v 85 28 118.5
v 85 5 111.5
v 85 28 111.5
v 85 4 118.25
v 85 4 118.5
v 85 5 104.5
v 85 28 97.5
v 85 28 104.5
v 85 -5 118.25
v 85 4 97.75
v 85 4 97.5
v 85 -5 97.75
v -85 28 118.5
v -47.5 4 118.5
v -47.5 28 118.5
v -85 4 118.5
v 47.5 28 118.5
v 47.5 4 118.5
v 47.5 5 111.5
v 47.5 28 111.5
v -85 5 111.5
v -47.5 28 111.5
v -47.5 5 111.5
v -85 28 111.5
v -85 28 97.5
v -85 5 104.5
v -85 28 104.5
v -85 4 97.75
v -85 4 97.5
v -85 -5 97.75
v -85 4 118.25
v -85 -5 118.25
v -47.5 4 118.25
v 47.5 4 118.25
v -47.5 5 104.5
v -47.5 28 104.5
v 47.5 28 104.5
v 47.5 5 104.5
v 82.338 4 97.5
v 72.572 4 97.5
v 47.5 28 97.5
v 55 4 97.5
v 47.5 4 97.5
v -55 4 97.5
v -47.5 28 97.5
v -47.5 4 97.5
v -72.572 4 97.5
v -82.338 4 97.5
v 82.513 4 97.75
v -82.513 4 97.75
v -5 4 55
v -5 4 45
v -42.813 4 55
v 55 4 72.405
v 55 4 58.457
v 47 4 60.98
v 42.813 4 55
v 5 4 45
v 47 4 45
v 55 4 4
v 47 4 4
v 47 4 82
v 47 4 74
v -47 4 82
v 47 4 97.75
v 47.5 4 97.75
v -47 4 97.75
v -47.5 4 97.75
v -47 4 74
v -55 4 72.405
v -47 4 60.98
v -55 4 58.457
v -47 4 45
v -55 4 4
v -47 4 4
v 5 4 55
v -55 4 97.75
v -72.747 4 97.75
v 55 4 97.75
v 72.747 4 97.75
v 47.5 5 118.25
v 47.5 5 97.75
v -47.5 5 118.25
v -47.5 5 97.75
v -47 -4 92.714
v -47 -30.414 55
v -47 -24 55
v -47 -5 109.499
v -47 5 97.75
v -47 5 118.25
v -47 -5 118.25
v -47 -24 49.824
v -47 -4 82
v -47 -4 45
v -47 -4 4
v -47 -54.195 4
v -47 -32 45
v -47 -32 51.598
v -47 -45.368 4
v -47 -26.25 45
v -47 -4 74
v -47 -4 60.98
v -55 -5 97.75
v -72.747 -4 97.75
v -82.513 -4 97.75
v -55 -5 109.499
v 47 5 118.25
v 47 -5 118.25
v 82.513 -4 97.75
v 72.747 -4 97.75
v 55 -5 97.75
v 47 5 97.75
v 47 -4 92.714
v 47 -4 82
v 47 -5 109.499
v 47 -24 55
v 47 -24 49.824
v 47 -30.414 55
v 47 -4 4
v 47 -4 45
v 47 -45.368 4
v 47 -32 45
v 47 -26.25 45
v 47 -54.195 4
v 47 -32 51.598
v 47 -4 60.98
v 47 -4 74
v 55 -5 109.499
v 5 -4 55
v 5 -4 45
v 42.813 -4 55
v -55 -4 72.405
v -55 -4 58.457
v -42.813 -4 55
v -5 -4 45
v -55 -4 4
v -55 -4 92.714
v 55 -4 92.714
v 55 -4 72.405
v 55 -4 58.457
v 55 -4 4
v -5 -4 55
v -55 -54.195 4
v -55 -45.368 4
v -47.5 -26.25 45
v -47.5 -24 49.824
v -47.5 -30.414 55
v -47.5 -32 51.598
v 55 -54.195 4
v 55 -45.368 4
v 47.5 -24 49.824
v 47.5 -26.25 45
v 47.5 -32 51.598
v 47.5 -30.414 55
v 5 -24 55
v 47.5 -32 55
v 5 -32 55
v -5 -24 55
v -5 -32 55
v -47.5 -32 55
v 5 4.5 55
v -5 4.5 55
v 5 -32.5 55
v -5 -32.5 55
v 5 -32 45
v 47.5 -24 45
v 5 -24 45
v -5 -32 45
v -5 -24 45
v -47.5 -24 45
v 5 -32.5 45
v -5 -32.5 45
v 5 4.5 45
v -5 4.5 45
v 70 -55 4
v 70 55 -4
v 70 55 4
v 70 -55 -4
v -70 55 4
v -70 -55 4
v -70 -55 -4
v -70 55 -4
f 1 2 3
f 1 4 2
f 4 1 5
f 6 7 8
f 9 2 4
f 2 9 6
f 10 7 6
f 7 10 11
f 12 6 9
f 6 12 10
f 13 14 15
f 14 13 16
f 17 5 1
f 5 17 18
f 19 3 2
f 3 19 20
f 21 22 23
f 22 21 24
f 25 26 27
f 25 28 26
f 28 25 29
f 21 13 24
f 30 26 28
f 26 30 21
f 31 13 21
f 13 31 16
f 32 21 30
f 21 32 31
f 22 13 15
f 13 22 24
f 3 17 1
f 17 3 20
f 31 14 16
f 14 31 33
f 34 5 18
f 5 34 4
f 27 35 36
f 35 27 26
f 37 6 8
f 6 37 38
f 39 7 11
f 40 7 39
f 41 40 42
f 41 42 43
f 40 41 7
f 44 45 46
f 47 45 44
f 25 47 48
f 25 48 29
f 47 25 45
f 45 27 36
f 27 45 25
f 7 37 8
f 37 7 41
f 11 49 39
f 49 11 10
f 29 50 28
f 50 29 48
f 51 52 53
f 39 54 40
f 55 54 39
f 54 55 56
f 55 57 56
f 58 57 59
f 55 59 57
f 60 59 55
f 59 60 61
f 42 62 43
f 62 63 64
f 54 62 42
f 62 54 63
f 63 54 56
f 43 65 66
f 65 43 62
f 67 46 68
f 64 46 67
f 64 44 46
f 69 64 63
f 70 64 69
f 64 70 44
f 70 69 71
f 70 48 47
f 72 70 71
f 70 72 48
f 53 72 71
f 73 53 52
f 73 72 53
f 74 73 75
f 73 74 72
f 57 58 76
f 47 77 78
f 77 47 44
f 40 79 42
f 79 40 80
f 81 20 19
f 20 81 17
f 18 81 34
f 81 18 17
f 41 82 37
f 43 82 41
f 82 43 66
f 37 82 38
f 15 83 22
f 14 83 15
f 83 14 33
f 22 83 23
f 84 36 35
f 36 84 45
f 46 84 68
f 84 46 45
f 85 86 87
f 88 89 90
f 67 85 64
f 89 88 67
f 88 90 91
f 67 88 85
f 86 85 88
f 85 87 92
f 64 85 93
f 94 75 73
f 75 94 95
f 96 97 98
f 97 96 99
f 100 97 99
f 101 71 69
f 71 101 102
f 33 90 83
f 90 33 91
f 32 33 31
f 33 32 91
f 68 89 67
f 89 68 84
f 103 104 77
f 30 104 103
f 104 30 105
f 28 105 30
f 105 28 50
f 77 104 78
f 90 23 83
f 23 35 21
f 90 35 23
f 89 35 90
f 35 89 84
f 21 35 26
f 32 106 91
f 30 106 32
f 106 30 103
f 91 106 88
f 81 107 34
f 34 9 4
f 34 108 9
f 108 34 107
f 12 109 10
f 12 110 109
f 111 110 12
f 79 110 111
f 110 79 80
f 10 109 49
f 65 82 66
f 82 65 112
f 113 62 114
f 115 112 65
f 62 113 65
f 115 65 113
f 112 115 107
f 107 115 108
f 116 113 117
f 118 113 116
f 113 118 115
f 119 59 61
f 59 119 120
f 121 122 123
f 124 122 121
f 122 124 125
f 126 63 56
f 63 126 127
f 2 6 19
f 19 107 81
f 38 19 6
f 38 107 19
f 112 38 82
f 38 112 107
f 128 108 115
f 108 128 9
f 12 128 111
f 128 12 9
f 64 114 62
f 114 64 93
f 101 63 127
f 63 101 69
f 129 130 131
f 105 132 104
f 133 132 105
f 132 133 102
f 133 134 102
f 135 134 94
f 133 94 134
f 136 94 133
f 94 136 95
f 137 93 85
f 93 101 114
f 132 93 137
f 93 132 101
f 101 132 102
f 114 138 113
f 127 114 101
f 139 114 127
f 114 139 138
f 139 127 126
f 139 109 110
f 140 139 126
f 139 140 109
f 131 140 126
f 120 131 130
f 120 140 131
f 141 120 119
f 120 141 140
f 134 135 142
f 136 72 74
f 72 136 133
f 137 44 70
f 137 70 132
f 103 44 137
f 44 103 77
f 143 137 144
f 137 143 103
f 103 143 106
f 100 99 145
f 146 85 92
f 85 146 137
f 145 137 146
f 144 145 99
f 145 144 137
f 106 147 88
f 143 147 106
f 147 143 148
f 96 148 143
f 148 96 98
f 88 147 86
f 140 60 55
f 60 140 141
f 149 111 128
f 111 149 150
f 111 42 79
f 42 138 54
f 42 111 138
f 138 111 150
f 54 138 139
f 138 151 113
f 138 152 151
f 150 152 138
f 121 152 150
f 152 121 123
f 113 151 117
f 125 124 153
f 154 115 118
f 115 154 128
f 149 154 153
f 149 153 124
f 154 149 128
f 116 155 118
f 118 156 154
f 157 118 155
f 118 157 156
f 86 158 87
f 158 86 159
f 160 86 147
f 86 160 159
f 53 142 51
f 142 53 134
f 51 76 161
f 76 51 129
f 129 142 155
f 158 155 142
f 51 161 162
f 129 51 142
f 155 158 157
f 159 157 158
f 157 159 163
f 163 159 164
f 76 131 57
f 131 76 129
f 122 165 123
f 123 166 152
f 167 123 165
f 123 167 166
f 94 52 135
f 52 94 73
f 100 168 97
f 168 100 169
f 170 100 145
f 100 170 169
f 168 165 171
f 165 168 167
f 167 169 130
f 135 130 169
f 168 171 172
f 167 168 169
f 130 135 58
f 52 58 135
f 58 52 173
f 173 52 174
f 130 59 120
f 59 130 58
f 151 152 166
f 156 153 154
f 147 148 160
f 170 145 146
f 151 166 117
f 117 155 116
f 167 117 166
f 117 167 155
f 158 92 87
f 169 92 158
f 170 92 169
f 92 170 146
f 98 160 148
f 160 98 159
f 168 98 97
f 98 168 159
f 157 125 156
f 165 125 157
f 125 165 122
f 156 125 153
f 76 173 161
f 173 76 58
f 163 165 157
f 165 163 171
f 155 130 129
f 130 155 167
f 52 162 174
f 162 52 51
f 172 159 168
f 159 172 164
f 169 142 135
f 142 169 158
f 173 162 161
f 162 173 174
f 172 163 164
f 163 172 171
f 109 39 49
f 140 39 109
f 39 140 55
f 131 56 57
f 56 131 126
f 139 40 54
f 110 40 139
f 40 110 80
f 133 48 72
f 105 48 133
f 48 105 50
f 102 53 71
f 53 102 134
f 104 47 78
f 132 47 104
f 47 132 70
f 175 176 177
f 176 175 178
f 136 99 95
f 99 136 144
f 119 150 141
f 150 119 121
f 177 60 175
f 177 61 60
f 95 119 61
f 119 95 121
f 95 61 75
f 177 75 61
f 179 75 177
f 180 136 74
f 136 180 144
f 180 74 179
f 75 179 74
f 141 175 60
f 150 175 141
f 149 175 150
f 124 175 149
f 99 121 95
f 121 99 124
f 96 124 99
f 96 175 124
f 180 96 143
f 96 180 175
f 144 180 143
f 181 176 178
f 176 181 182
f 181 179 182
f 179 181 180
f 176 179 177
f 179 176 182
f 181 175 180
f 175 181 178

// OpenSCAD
// file: ../robot_settings.scad
main_box_x = 100; // 96
main_box_y = 102;
main_box_z = 74; // 74.5

lfp_main_box_x = 65;
lfp_main_box_y = 152;
lfp_main_box_z = 94;

wall_thickness = 5;

rail_gap = 2;
rail_inset = 7;

rail_thickness = 7;
rail_length = 250;
rail_width = 260;

lfp_battery_width = 65.5;
lfp_battery_depth = 150.5;
lfp_battery_height = 93;
lfp_battery_midterrace_width = 64.8;
lfp_battery_midterrace_depth = 150.2;
lfp_battery_midterrace_height = 7.8;
lfp_battery_topterrace_width = 62.8;
lfp_battery_topterrace_depth = 149.4;
lfp_battery_topterrace_height = 6.6;

// red right
// black left
lfp_battery_terminal_width = 9.2;
lfp_battery_terminal_depth = 9.5;
lfp_battery_terminal_depth_setback = 4.4;
lfp_battery_terminal_width_setback = 5.9;

raspberry_pi_screw_seperation_y = 57;
raspberry_pi_screw_seperation_z = 48;
raspberry_pi_peg_h = 5;

battery_box_peg_h = 6;
battery_box_peg_d = 9.5;
battery_box_peg_cutout = 5;

gears_module = 1;
pinion_gear_teeth = 32;
pinion_gear_width = 5;
pinion_gear_bore = 8;

gears_setback_distance = 25;
gear_post_height = 2 * pinion_gear_width + rail_thickness + 8 ;

steering_motor_mount_x = 45;
steering_motor_mount_y = 36;
steering_motor_mount_z = 18;
steering_motor_mount_setback_distance = gears_setback_distance + 16;

cradle_wall_thickness = 5;
post_thickness_x_y = 10;
post_wallside_position_y = 12.5;
post_separation_y = 47.5;
post_x_position = 70; // width of cradle. this is proportional to rail_width.

imu_width = 26; // x is along the width axis
imu_depth = 16; // y is along the depth axes. +y points at pins.
imu_screw_d = 3;
imu_screw_corner_border = 1.27;
imu_underside_pin_h = 1; // z is along the h axis
imu_thickness = 1.6;
imu_left_edge_pins = 1.6;

dc_motor_drivertype = "Teyleten"; // Teyleten
isAdafruit = (dc_motor_drivertype == "Adafruit");

drv8871_x = isAdafruit ? 20.3 : 21.6;
drv8871_y = isAdafruit ?  24 : 25;

drv8871_z = 2;
drv8871_screw_d = 2.5;
drv8871_solder_points_z = 2;

drv8871mount_edge_x = 1.5;
drv8871mount_edge_wall = 3;
drv8871mount_z = 5;
drv8871mount_x = drv8871_x +  drv8871mount_edge_wall - 2* drv8871mount_edge_x;
drv8871mount_y = 19;

drv8871_screw_distance = 15.64;
drv8871_solder_points_d = 1.66;
drv8871_solder_offset_y = 4.4;
drv8871_solder_inner_points_distance = 5;
drv8871_solder_outer_points_distance = 12;

dc_motor_75_1_encoder_z = 14.75;
dc_motor_75_1_encoder_d = 24.5;
dc_motor_75_1_housing_z = 30;
dc_motor_75_1_housing_d = 24.1;
dc_motor_75_1_gearbox_z = 23;
dc_motor_75_1_gearbox_d = 24.8;
dc_motor_75_1_z = dc_motor_75_1_encoder_z + dc_motor_75_1_housing_z + dc_motor_75_1_gearbox_z;

dc_motor_housing_minus_encoder_z = 48;
dc_motor_encoder_z = 9.33;
dc_motor_encoder_wheel_d = 13.4;
dc_motor_encoder_wheel_thickness = 5;
dc_motor_encoder_wheel_gap = 3;
dc_motor_encoder_circuit_thickness = 2;
dc_motor_z = dc_motor_housing_minus_encoder_z + dc_motor_encoder_z + dc_motor_encoder_wheel_thickness + dc_motor_encoder_wheel_gap + dc_motor_encoder_circuit_thickness;
dc_motor_cutout_d = 24.8;
dc_motor_cutout_z = 19.5;


M3_shaft_d = 2.82;

dc_motor_screw_head_z = 2;
dc_motor_screw_head_d = 5.6;
dc_motor_screw_d = 3.2;
dc_motor_screw_offset = 8.5;

dc_motor_axle_ring_z = 3;
dc_motor_axle_ring_d = 7.2;
dc_motor_axle_cutout_d = 4.2;
dc_motor_axle_cutout_z = 10;
dc_motor_axle_notch_cutout = 0.4;
dc_motor_axle_notch_cutout_z = 6;

pdmount_x = 20;
pdmount_y = 30;
pdmount_z = 2;
pdmount_edge_x = 1.5;
pdmount_edge_wall = 3;

steering_shaft_z = 45;
steering_shaft_d = 7;
steering_shaft_motor_fitting_d = 9;
coupler_length = 24.6;
coupler_diameter = 14;
coupler_screw_d = 4;
coupler_screw_z_offset = 8.3;
coupler_gear_side_insert = 12.6;
steering_shaft_with_coupler_z = steering_shaft_z - coupler_gear_side_insert;

lidar_mount_y = 110;
lidar_mount_x = 65 + 20;
lidar_narrow_screws = 40;
lidar_wide_screws = 56;
lidar_front_to_back_screws = 70;
lidar_screw_d = 3;
lidar_circuitboard_x = 20;
lidar_circuitboard_y = 35;
lidar_circuitboard_z = 1.2;
lidar_cord_length = 29;

ball_bearing_height = 7;
ball_bearing_outer_diameter = 22;
ball_bearing_inner_diameter = 8;

M4_diameter = 5.1;
M3_diameter = 2.9;
M3_length = 35;
M3_cap_length= 3;
M3_cap_diameter = 5.44;

suspension_spring_outer_diameter = 8;
suspension_spring_inner_diameter = 5.3;

armature_holder_height = 20;
armature_holder_thickness = 8;
pull_bar_peg_r = 3.2;
apparatus_locking_peg_d = 4;

rack_module = 1;
rack_length = main_box_x;
rack_height = 5;
rack_width = 10;
rack_teeth = 30;
rack_bore = 3;

pull_bar_length = rail_width / 2 - rack_length + 1;

// tire hardware
axle_length = 42.0; 
axle_reciever_inner_diameter = ball_bearing_inner_diameter;
axle_reciever_outer_diameter = 12;
axle_reciever_length = 18.8;
axle_notch_length = 15;
axle_notch_cutout = 2.4;

// power distribution bar
power_bar_cutout_x = 96;
power_bar_y = 19.1;
power_bar_z = 1.5;
power_bar_screw_distance = 91.4;
power_bar_screw_d = 2.8;
power_bar_standoff_z = 5;
power_bar_standoff_d = 6.83;

pico_expander_width = 63;
pico_expander_height = 57;
pico_screw_hole_offset = 3;
pico_screw_hole_d = 2.5;

usbhub_thickness = 11.7;
usbhub_depth = 37.5;
usbhub_width = 86.7;
usbhub_end_port_width = 14.8;
usbhub_end_port_height = 12;
usbhub_front_face_safe_zone_left = 15;
usbhub_front_face_safe_zone_right = 14.8;

switch_w = 16;
switch_cutout_d = 12.2;
switch_bump_h = 2;
switch_bump_l = 18.2;

i2c_mount_thickness = 3;
i2c_w = 28;
i2c_l = 28;
i2c_circuitboard_thickness = 1.23;
i2c_bottom_notch_w = 14.35;
i2c_bottom_notch_depth = 1;
i2c_screw_hole_d = 1.9;
i2c_screw_hole_offset = 1.4;
i2c_pin_l = 11;
i2c_pin_d = 0.8;
i2c_pin_offset = 1.5;
i2c_pin_separation = 2.5;
i2c_all_pins_l = 8.3;
i2c_screen_thickness = 1.88;
i2c_screen_w = 14.6;
i2c_screen_d = 27;
i2c_screen_offset = 4.1;
// main file
   include <../robot_settings.scad>
   
   // front end jack
  module front_jack()
  {
    // top bar
//    translate([0, 0, 108]) {
//      difference() {
//        cube([2.05 * lidar_mount_x, 10, dc_motor_cutout_d], center = true);    
//    
//        translate([0, 0,  -rail_thickness + 7])
//        cube([lidar_mount_x + 10, 24, 4 * rail_thickness], center = true);
//       } 
//   }
// 
     // left post
    translate([-51, 0, 54])
    cube([8,8,108], center = true);
    
    // left back support
    translate([-51,  -26, 55])
    rotate([-25, 0, 0])
    color("green")
    cube([8, 8, 120], center = true);
    
    // center post
//    translate([0, 0, 108/2])
//    cube([8,8, 108], center = true);
   
    // center back support 
//    translate([0,  -26, 55])
//    rotate([-25, 0, 0])
//    cube([8, 8, 120], center = true);
    
    // right post
    translate([51, 0, 108/2])
    cube([8,8, 108], center = true);
   
    // right back support 
    translate([51,  -26, 55])
    rotate([-25, 0, 0])
    cube([8, 8, 120], center = true);
    
    // front cross beam
    translate([0, 0, 50])
    cube([95, 8, 10], center = true);
    
    // back cross beam
    translate([0, -28, 50])
    color("green")
    cube([95, 8, 10], center = true);
    
    // cross beam connector
    translate([0, -14, 50])
    cube([10, 37, 10], center = true);
   
   // clam 
   translate([0, 16, 108]) {
   difference() {
        union() {
            // left upper clam
            translate([0,  0, rail_thickness])
            cube([2 * lidar_mount_x,  24, rail_thickness], center = true);
            
            // left lower clam
            translate([0,  0, -rail_thickness])
            cube([2 * lidar_mount_x,  24, rail_thickness], center = true);
        }
        
        // remove the middle clam
        translate([0, 7, 0])
        cube([95, 40, 4 * rail_thickness], center = true);
        }
        
        // left rear support
        translate([-66, -16, 0])
        color("blue")
        cube([38, 10, 20.5], center = true);
        
        // right rear support
        translate([66, -16, 0])
        cube([38, 10, 20.5], center = true);
        
        translate([0, -16, -30])
        cube([100, 8, 8], center = true);
     }

    // side angle support
    translate([61, 0, 74])
    rotate([0, 35, 0])
    color("red")
    cube([8, 8, 65], center = true);

    // side angle support
    translate([-61, 0, 74])
    rotate([0, -35, 0])
    cube([8, 8, 65], center = true);
    
    // platform
    translate([0,  0, 0])
      cube([140, 110, 8], center = true);
}
front_jack();
